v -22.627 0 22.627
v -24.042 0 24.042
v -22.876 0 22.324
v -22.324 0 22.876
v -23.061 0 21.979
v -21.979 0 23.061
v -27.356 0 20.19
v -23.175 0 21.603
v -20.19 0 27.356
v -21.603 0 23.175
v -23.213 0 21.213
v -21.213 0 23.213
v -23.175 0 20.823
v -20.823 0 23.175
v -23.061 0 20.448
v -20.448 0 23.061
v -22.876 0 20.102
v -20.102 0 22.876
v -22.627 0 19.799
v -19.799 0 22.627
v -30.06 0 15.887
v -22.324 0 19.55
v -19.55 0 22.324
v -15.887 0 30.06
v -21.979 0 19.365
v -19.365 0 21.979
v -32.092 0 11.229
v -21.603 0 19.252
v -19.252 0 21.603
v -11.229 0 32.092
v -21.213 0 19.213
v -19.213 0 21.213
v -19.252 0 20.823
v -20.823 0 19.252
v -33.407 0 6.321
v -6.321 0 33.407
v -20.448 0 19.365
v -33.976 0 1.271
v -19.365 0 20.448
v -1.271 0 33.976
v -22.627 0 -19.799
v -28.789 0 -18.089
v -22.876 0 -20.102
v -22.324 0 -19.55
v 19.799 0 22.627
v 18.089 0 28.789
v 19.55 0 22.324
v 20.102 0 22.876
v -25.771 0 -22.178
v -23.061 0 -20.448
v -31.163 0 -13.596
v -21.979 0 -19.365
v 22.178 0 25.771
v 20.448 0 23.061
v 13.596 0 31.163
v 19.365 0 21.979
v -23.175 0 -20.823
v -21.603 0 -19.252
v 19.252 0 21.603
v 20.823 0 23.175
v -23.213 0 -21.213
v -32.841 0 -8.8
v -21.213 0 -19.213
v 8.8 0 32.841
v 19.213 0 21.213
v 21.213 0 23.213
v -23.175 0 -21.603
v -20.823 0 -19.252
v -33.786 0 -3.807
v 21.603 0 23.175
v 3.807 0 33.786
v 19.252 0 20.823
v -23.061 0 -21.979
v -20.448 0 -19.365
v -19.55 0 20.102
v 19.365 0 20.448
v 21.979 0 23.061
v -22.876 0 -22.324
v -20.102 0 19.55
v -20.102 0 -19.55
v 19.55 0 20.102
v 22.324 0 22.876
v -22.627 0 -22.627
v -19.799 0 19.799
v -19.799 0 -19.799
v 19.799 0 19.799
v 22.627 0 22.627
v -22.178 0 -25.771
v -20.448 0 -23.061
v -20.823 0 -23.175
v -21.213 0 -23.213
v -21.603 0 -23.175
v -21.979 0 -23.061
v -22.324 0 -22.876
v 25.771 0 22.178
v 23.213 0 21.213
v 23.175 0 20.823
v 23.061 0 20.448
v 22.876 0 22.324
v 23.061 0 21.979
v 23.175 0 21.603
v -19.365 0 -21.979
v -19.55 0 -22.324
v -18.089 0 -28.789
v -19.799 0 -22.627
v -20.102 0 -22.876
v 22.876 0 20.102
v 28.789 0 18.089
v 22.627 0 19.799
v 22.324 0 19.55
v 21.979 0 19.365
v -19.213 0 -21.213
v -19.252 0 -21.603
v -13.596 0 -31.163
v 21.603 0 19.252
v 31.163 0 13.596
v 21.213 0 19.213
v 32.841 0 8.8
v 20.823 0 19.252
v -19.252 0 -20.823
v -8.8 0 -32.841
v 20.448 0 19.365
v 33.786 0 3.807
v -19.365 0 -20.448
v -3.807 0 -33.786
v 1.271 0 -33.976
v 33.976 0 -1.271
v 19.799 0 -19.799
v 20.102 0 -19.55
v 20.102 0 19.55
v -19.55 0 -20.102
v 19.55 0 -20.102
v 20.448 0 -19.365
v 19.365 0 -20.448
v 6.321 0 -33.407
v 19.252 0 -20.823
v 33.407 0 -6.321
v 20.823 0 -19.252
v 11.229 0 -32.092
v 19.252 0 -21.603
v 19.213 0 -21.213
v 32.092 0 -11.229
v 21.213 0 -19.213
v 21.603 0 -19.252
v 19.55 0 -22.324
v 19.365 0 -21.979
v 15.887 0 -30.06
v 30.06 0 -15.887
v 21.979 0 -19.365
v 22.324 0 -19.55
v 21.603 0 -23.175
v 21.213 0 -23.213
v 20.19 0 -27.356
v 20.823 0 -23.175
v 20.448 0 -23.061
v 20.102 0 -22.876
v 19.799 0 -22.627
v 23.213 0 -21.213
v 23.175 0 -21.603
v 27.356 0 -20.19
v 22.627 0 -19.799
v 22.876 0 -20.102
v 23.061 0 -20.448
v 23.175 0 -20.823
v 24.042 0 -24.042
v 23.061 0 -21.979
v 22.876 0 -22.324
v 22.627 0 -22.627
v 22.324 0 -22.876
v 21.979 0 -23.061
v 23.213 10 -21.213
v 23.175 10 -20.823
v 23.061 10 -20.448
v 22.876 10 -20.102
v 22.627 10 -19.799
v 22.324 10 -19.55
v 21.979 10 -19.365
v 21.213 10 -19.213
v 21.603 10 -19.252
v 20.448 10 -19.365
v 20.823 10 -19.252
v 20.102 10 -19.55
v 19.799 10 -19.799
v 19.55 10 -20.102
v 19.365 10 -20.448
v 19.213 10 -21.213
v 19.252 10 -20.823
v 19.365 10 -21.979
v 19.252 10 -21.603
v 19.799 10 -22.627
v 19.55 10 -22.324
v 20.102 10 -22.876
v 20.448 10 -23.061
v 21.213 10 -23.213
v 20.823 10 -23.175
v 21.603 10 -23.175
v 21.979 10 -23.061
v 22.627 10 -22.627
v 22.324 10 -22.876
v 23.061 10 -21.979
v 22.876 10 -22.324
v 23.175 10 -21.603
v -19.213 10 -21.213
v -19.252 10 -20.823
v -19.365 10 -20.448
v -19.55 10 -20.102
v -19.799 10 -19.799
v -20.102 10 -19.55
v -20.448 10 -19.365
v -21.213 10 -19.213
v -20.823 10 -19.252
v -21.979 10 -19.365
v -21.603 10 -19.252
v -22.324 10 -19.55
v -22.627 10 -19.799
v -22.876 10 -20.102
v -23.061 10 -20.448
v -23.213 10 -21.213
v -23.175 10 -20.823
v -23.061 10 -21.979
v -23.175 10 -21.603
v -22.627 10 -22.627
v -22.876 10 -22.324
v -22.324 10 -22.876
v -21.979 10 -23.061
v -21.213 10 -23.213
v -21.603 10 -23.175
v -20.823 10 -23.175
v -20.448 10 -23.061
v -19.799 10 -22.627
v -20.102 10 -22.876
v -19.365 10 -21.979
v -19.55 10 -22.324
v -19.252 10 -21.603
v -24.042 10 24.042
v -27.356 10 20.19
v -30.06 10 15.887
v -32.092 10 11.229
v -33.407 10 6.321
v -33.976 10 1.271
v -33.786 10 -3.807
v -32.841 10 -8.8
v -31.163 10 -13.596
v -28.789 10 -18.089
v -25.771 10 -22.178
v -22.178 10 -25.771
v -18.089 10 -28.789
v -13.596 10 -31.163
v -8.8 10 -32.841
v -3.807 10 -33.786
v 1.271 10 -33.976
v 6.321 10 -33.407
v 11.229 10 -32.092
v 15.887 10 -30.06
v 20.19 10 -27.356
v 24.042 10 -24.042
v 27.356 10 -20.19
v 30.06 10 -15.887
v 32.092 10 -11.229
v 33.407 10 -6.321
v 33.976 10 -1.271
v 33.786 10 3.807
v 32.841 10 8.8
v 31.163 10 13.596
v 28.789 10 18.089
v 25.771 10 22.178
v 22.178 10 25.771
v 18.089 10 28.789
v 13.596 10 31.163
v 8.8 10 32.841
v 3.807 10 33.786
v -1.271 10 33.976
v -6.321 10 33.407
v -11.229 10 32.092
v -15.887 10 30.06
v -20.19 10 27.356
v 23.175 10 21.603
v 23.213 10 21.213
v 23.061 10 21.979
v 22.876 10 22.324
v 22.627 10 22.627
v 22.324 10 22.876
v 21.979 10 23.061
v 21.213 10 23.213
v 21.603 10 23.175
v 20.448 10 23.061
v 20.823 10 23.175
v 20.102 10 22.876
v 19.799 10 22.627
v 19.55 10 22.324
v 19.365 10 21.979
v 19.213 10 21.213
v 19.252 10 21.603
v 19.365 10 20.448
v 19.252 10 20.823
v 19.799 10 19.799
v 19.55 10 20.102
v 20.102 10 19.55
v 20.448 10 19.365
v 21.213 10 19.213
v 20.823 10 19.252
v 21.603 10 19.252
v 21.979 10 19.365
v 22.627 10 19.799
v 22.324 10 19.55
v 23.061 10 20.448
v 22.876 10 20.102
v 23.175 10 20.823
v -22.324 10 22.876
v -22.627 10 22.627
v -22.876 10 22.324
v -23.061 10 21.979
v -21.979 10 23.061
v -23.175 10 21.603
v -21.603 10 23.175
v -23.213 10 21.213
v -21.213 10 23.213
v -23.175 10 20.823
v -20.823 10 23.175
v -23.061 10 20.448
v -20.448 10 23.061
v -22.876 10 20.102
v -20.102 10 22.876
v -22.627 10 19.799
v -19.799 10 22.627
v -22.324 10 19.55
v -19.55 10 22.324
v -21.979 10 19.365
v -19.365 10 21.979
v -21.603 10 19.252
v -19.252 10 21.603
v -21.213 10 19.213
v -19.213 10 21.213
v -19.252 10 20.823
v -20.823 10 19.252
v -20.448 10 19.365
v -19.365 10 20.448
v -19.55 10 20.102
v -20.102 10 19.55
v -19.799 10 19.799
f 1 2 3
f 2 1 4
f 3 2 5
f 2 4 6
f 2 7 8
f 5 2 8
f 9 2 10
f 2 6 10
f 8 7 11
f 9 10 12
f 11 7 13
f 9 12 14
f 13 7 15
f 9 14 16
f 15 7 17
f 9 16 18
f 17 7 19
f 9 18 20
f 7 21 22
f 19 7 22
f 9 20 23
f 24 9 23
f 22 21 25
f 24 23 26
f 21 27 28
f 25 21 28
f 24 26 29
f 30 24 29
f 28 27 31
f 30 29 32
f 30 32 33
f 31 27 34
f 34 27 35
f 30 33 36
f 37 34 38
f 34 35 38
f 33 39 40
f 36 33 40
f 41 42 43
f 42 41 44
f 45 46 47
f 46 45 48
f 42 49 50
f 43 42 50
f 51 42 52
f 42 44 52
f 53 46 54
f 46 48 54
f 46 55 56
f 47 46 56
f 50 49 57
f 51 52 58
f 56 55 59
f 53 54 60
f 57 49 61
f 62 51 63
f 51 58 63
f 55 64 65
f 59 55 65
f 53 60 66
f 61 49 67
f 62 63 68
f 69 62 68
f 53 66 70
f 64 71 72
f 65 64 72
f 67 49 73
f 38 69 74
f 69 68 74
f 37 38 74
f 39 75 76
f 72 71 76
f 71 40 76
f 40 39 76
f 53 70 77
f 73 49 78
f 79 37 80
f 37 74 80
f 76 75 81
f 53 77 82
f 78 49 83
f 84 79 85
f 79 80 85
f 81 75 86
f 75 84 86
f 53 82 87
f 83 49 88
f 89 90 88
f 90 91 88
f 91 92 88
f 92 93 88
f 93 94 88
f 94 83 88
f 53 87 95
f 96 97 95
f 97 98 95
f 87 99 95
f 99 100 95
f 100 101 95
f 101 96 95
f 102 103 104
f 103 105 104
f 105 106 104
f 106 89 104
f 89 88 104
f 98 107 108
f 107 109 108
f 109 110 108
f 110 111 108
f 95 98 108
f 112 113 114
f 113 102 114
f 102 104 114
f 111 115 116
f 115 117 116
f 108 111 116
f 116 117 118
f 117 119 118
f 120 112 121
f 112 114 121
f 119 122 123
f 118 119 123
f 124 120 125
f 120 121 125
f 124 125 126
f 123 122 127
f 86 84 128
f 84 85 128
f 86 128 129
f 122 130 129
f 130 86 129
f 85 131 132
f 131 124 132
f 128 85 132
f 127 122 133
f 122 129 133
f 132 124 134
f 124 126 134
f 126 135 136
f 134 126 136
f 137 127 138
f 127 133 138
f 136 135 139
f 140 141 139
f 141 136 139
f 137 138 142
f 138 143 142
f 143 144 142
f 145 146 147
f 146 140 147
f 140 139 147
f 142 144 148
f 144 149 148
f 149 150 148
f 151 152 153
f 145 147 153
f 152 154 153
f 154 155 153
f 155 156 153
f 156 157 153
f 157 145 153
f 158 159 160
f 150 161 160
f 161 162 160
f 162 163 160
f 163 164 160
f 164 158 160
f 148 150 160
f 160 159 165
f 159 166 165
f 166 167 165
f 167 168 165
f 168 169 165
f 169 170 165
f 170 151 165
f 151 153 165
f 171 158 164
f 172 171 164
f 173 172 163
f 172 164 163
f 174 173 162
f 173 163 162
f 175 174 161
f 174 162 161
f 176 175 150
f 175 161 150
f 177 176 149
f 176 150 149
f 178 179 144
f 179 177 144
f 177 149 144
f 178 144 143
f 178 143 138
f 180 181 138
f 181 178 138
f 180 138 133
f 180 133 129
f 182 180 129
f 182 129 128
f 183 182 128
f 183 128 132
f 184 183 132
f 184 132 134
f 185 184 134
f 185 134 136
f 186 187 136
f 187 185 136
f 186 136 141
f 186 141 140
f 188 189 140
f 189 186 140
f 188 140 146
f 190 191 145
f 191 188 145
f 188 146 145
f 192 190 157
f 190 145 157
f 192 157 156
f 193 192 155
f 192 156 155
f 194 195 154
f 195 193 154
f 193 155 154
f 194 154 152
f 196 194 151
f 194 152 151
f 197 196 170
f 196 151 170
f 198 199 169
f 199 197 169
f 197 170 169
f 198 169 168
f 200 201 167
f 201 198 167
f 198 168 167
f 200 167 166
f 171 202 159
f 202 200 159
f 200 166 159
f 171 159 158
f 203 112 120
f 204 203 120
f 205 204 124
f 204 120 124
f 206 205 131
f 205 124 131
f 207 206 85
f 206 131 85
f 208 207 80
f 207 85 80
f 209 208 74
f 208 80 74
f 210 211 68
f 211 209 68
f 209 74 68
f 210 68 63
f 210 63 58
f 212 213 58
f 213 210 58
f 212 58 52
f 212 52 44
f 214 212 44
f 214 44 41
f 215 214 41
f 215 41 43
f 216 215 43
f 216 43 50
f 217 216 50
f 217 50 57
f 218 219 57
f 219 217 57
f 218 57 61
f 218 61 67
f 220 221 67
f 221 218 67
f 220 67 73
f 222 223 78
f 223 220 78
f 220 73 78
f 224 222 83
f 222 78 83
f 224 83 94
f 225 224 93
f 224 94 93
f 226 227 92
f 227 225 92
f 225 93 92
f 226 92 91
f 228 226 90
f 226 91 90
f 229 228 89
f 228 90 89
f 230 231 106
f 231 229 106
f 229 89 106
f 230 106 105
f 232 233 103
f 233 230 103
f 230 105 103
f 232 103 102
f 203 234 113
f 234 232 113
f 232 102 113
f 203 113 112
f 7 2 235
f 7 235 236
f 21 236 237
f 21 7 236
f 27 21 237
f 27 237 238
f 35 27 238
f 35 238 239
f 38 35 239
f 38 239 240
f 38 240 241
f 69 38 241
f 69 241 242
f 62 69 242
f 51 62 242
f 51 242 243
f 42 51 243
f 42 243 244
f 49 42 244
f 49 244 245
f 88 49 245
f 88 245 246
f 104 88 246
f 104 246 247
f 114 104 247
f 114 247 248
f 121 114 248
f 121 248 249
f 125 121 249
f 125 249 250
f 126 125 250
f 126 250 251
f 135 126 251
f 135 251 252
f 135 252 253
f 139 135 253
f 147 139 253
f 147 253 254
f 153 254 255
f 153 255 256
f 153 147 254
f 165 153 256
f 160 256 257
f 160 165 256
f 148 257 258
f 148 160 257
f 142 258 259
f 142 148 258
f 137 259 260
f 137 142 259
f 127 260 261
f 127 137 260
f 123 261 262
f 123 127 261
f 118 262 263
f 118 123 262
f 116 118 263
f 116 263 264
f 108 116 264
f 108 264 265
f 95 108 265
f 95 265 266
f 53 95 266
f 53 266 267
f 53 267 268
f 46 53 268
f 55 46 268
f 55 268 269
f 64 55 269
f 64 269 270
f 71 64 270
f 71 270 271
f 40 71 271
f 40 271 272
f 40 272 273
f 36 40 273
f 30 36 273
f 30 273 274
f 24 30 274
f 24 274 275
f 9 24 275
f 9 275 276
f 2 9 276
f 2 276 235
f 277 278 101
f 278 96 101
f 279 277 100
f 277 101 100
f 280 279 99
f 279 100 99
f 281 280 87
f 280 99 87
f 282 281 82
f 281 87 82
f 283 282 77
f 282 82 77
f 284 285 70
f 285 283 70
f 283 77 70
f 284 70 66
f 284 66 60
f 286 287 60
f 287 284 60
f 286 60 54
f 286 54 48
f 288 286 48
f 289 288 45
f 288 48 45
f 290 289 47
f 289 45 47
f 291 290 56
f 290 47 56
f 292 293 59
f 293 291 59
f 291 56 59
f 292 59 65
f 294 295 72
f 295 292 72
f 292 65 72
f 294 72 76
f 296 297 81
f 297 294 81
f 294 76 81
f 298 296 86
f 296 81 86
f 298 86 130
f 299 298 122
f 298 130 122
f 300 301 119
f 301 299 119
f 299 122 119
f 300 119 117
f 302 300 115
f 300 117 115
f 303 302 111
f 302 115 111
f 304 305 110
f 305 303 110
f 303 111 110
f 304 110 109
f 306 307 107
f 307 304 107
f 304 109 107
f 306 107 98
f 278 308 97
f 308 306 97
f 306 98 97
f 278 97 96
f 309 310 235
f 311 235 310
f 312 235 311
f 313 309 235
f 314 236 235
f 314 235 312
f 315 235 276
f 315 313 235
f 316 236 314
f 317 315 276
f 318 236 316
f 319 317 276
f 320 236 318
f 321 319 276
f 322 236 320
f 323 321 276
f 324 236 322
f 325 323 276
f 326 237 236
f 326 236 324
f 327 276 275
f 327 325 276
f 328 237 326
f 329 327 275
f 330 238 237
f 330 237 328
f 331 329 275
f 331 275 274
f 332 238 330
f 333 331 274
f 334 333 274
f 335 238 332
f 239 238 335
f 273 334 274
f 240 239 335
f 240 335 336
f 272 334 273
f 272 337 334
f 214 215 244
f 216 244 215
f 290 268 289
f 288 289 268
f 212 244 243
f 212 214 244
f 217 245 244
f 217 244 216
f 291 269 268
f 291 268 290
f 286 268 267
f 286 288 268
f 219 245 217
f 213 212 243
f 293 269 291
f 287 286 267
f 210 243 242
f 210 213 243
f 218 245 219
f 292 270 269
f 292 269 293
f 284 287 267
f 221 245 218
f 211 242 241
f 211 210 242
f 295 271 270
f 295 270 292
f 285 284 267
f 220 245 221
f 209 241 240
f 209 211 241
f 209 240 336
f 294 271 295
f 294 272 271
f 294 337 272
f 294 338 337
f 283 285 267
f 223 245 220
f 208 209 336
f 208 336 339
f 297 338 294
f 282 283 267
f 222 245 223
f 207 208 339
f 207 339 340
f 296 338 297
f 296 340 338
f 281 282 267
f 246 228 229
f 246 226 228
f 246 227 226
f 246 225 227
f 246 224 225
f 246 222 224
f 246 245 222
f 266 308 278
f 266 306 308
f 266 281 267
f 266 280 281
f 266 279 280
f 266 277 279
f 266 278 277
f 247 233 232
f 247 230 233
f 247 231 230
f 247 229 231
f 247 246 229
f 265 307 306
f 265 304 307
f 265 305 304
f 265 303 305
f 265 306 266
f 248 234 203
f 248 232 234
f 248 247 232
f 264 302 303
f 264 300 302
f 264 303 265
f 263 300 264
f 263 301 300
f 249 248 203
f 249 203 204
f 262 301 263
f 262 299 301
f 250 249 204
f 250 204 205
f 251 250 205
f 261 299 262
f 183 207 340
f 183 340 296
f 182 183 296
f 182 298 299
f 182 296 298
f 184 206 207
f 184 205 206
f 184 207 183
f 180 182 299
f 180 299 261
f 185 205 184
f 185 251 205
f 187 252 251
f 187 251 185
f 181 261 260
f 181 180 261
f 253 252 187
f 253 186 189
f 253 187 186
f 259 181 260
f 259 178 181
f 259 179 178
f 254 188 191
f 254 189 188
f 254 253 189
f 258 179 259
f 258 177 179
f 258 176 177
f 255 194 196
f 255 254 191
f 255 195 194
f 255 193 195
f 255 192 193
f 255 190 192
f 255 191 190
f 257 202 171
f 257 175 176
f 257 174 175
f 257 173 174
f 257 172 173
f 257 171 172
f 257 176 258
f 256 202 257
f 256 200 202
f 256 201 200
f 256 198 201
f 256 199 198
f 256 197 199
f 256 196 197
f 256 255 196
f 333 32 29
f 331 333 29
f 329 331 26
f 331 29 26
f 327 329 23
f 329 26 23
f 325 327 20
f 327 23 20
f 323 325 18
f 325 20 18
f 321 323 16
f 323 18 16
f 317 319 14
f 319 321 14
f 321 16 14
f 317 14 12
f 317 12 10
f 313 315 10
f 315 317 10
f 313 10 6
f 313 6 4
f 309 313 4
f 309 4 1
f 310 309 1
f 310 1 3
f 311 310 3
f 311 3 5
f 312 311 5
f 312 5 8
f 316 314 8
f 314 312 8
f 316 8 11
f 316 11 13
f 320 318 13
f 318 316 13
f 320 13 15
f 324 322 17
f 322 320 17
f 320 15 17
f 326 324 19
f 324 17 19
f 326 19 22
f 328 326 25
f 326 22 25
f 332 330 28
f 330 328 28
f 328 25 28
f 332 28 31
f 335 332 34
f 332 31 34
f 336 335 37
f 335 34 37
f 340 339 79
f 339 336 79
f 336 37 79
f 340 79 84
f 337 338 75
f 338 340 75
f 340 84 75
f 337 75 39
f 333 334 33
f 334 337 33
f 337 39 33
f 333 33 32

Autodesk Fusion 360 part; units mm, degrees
sketch "Sketch1" plane through (0, 0, 0) normal (1, 0, 0) x (0, 1, 0)
sketch "Sketch2" plane through (0, 0, 0) normal (0, 0, 1) x (1, 0, 0)
sketch "Sketch3" plane through (0, 0, 0) normal (1, 0, 0) x (0, 1, 0)
sketch "Sketch4" plane through (0, 0, 0) normal (1, 0, 0) x (0, 1, 0)
sketch "Sketch5" plane through (0, 0, 0) normal (0, 1, 0) x (1, 0, 0)
  circle A0 centre (0, 0) radius 18
  circle A1 centre (0, 0) radius 8
  line L0 (0, 11.547) -> (-10, 5.7735)
  line L1 (-10, 5.7735) -> (-10, -5.7735)
  line L2 (-10, -5.7735) -> (0, -11.547)
  line L3 (0, -11.547) -> (10, -5.7735)
  line L4 (10, -5.7735) -> (10, 5.7735)
  line L5 (10, 5.7735) -> (0, 11.547)
  arc A2 (18.3848, -24.0416) -> (24.0416, -18.3848) centre (21.2132, -21.2132) ccw
  arc A3 (-18.3848, 24.0416) -> (-24.0416, 18.3848) centre (-21.2132, 21.2132) ccw
  line L6 (-21.2132, 21.2132) -> (21.2132, -21.2132) construction
  circle A4 centre (21.2132, -21.2132) radius 2
  circle A5 centre (-21.2132, 21.2132) radius 2
  arc A6 (24.0416, 18.3848) -> (18.3848, 24.0416) centre (21.2132, 21.2132) ccw
  arc A7 (-24.0416, -18.3848) -> (-18.3848, -24.0416) centre (-21.2132, -21.2132) ccw
  circle A8 centre (-21.2132, -21.2132) radius 2
  circle A9 centre (21.2132, 21.2132) radius 2
  arc A10 (24.0416, -24.0416) -> (24.0416, 24.0416) centre (0, 0) ccw
  arc A11 (24.0416, 24.0416) -> (-24.0416, 24.0416) centre (0, 0) ccw
  arc A12 (-24.0416, 24.0416) -> (-24.0416, -24.0416) centre (0, 0) ccw
  arc A13 (-24.0416, -24.0416) -> (24.0416, -24.0416) centre (0, 0) ccw
  line L7 (-24.0416, -18.3848) -> (-15.2381, -9.5812)
  line L8 (-21.2132, -21.2132) -> (-12.7279, -12.7279) construction
  line L9 (-9.5812, -15.2381) -> (-18.3848, -24.0416)
  line L10 (9.5812, -15.2381) -> (18.3848, -24.0416)
  line L11 (24.0416, -18.3848) -> (15.2381, -9.5812)
  line L12 (24.0416, 18.3848) -> (15.2381, 9.5812)
  line L13 (12.7279, 12.7279) -> (21.2132, 21.2132) construction
  line L14 (9.5812, 15.2381) -> (18.3848, 24.0416)
  line L15 (-9.5812, 15.2381) -> (-18.3848, 24.0416)
  line L16 (-24.0416, 18.3848) -> (-15.2381, 9.5812)
  line L17 (0, 0) -> (5.6569, 0) construction
  line L18 (8, 0) -> (30, 0) construction
  dimension "d3" = 36
  dimension "d4" = 16
  dimension "d5" = 10
  dimension "d8" = 8
  dimension "d9" = 45
  dimension "d10" = 4
  dimension "d11" = 4
  dimension "d12" = 60
  dimension "d14" = 34
  dimension "d16" = 360
sketch "Sketch6" plane through (0, 0, 0) normal (0, 1, 0) x (1, 0, 0)
extrude "Extrude1" add sketch "Sketch5" along normal blind 10 contours A0 | A0 A2 A6 A10 L11 L12 | A0 A6 L12 L14 | A0 A2 L10 L11 | A0 A3 A6 A11 L14 L15 | A0 A2 A7 A13 L9 L10 | A0 A3 L15 L16 | A0 A7 L7 L9 | A0 A3 A7 A12 L7 L16 | A1 | L0 L1 L2 L3 L4 L5
